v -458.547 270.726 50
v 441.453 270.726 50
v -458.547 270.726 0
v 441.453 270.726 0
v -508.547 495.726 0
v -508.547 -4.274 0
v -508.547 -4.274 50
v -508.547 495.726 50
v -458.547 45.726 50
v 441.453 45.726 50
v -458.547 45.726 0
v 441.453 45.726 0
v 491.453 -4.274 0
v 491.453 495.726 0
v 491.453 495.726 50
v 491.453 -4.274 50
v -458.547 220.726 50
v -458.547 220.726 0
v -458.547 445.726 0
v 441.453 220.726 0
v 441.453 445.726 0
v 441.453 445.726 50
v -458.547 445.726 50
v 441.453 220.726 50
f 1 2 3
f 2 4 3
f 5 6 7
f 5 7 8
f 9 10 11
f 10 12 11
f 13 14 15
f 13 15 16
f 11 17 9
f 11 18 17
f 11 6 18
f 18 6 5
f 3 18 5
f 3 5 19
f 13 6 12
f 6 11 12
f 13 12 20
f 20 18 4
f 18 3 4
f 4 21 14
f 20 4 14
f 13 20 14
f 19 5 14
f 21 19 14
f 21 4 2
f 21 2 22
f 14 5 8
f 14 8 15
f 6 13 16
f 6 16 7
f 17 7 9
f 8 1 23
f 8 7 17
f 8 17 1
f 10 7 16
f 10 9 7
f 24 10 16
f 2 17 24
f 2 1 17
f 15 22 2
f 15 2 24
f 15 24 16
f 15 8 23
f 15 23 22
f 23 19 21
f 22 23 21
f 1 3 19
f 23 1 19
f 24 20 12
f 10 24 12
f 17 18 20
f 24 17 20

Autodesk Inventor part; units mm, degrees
ref_plane "YZ Plane" through (0, 0, 0) normal (1, 0, 0) x (0, 1, 0)
ref_plane "XZ Plane" through (0, 0, 0) normal (0, 1, 0) x (-1, 0, 0)
ref_plane "XY Plane" through (0, 0, 0) normal (0, 0, 1) x (1, 0, 0)
sketch "Boceto1" plane through (0, 0, 0) normal (0, 0, 1) x (1, 0, 0)
  line L0 (-508.547, 495.7265) -> (491.453, 495.7265)
  line L1 (491.453, 495.7265) -> (491.453, -4.2735)
  line L2 (491.453, -4.2735) -> (-508.547, -4.2735)
  line L3 (-508.547, -4.2735) -> (-508.547, 495.7265)
  line L4 (-458.547, 445.7265) -> (441.453, 445.7265)
  line L5 (441.453, 45.7265) -> (-458.547, 45.7265)
  line L6 (441.453, 270.7265) -> (-458.547, 270.7265)
  line L7 (-458.547, 220.7265) -> (441.453, 220.7265)
  line L8 (-458.547, 270.7265) -> (-458.547, 445.7265)
  line L9 (-458.547, 220.7265) -> (-458.547, 45.7265)
  line L10 (441.453, 270.7265) -> (441.453, 445.7265)
  line L11 (441.453, 220.7265) -> (441.453, 45.7265)
  point P0 (0, 0)
  dimension "d0" = 1000
  dimension "d1" = 500
  dimension "d2" = 900
  dimension "d4" = 400
  dimension "d5" = 50
  dimension "d17" = 175
  dimension "d18" = 175
  dimension "d19" = 175
  dimension "d20" = 175
extrude "Extrusión1" add sketch "Boceto1" along normal blind 50
properties part number "Base_mesa" material "Hierro, fundido"
